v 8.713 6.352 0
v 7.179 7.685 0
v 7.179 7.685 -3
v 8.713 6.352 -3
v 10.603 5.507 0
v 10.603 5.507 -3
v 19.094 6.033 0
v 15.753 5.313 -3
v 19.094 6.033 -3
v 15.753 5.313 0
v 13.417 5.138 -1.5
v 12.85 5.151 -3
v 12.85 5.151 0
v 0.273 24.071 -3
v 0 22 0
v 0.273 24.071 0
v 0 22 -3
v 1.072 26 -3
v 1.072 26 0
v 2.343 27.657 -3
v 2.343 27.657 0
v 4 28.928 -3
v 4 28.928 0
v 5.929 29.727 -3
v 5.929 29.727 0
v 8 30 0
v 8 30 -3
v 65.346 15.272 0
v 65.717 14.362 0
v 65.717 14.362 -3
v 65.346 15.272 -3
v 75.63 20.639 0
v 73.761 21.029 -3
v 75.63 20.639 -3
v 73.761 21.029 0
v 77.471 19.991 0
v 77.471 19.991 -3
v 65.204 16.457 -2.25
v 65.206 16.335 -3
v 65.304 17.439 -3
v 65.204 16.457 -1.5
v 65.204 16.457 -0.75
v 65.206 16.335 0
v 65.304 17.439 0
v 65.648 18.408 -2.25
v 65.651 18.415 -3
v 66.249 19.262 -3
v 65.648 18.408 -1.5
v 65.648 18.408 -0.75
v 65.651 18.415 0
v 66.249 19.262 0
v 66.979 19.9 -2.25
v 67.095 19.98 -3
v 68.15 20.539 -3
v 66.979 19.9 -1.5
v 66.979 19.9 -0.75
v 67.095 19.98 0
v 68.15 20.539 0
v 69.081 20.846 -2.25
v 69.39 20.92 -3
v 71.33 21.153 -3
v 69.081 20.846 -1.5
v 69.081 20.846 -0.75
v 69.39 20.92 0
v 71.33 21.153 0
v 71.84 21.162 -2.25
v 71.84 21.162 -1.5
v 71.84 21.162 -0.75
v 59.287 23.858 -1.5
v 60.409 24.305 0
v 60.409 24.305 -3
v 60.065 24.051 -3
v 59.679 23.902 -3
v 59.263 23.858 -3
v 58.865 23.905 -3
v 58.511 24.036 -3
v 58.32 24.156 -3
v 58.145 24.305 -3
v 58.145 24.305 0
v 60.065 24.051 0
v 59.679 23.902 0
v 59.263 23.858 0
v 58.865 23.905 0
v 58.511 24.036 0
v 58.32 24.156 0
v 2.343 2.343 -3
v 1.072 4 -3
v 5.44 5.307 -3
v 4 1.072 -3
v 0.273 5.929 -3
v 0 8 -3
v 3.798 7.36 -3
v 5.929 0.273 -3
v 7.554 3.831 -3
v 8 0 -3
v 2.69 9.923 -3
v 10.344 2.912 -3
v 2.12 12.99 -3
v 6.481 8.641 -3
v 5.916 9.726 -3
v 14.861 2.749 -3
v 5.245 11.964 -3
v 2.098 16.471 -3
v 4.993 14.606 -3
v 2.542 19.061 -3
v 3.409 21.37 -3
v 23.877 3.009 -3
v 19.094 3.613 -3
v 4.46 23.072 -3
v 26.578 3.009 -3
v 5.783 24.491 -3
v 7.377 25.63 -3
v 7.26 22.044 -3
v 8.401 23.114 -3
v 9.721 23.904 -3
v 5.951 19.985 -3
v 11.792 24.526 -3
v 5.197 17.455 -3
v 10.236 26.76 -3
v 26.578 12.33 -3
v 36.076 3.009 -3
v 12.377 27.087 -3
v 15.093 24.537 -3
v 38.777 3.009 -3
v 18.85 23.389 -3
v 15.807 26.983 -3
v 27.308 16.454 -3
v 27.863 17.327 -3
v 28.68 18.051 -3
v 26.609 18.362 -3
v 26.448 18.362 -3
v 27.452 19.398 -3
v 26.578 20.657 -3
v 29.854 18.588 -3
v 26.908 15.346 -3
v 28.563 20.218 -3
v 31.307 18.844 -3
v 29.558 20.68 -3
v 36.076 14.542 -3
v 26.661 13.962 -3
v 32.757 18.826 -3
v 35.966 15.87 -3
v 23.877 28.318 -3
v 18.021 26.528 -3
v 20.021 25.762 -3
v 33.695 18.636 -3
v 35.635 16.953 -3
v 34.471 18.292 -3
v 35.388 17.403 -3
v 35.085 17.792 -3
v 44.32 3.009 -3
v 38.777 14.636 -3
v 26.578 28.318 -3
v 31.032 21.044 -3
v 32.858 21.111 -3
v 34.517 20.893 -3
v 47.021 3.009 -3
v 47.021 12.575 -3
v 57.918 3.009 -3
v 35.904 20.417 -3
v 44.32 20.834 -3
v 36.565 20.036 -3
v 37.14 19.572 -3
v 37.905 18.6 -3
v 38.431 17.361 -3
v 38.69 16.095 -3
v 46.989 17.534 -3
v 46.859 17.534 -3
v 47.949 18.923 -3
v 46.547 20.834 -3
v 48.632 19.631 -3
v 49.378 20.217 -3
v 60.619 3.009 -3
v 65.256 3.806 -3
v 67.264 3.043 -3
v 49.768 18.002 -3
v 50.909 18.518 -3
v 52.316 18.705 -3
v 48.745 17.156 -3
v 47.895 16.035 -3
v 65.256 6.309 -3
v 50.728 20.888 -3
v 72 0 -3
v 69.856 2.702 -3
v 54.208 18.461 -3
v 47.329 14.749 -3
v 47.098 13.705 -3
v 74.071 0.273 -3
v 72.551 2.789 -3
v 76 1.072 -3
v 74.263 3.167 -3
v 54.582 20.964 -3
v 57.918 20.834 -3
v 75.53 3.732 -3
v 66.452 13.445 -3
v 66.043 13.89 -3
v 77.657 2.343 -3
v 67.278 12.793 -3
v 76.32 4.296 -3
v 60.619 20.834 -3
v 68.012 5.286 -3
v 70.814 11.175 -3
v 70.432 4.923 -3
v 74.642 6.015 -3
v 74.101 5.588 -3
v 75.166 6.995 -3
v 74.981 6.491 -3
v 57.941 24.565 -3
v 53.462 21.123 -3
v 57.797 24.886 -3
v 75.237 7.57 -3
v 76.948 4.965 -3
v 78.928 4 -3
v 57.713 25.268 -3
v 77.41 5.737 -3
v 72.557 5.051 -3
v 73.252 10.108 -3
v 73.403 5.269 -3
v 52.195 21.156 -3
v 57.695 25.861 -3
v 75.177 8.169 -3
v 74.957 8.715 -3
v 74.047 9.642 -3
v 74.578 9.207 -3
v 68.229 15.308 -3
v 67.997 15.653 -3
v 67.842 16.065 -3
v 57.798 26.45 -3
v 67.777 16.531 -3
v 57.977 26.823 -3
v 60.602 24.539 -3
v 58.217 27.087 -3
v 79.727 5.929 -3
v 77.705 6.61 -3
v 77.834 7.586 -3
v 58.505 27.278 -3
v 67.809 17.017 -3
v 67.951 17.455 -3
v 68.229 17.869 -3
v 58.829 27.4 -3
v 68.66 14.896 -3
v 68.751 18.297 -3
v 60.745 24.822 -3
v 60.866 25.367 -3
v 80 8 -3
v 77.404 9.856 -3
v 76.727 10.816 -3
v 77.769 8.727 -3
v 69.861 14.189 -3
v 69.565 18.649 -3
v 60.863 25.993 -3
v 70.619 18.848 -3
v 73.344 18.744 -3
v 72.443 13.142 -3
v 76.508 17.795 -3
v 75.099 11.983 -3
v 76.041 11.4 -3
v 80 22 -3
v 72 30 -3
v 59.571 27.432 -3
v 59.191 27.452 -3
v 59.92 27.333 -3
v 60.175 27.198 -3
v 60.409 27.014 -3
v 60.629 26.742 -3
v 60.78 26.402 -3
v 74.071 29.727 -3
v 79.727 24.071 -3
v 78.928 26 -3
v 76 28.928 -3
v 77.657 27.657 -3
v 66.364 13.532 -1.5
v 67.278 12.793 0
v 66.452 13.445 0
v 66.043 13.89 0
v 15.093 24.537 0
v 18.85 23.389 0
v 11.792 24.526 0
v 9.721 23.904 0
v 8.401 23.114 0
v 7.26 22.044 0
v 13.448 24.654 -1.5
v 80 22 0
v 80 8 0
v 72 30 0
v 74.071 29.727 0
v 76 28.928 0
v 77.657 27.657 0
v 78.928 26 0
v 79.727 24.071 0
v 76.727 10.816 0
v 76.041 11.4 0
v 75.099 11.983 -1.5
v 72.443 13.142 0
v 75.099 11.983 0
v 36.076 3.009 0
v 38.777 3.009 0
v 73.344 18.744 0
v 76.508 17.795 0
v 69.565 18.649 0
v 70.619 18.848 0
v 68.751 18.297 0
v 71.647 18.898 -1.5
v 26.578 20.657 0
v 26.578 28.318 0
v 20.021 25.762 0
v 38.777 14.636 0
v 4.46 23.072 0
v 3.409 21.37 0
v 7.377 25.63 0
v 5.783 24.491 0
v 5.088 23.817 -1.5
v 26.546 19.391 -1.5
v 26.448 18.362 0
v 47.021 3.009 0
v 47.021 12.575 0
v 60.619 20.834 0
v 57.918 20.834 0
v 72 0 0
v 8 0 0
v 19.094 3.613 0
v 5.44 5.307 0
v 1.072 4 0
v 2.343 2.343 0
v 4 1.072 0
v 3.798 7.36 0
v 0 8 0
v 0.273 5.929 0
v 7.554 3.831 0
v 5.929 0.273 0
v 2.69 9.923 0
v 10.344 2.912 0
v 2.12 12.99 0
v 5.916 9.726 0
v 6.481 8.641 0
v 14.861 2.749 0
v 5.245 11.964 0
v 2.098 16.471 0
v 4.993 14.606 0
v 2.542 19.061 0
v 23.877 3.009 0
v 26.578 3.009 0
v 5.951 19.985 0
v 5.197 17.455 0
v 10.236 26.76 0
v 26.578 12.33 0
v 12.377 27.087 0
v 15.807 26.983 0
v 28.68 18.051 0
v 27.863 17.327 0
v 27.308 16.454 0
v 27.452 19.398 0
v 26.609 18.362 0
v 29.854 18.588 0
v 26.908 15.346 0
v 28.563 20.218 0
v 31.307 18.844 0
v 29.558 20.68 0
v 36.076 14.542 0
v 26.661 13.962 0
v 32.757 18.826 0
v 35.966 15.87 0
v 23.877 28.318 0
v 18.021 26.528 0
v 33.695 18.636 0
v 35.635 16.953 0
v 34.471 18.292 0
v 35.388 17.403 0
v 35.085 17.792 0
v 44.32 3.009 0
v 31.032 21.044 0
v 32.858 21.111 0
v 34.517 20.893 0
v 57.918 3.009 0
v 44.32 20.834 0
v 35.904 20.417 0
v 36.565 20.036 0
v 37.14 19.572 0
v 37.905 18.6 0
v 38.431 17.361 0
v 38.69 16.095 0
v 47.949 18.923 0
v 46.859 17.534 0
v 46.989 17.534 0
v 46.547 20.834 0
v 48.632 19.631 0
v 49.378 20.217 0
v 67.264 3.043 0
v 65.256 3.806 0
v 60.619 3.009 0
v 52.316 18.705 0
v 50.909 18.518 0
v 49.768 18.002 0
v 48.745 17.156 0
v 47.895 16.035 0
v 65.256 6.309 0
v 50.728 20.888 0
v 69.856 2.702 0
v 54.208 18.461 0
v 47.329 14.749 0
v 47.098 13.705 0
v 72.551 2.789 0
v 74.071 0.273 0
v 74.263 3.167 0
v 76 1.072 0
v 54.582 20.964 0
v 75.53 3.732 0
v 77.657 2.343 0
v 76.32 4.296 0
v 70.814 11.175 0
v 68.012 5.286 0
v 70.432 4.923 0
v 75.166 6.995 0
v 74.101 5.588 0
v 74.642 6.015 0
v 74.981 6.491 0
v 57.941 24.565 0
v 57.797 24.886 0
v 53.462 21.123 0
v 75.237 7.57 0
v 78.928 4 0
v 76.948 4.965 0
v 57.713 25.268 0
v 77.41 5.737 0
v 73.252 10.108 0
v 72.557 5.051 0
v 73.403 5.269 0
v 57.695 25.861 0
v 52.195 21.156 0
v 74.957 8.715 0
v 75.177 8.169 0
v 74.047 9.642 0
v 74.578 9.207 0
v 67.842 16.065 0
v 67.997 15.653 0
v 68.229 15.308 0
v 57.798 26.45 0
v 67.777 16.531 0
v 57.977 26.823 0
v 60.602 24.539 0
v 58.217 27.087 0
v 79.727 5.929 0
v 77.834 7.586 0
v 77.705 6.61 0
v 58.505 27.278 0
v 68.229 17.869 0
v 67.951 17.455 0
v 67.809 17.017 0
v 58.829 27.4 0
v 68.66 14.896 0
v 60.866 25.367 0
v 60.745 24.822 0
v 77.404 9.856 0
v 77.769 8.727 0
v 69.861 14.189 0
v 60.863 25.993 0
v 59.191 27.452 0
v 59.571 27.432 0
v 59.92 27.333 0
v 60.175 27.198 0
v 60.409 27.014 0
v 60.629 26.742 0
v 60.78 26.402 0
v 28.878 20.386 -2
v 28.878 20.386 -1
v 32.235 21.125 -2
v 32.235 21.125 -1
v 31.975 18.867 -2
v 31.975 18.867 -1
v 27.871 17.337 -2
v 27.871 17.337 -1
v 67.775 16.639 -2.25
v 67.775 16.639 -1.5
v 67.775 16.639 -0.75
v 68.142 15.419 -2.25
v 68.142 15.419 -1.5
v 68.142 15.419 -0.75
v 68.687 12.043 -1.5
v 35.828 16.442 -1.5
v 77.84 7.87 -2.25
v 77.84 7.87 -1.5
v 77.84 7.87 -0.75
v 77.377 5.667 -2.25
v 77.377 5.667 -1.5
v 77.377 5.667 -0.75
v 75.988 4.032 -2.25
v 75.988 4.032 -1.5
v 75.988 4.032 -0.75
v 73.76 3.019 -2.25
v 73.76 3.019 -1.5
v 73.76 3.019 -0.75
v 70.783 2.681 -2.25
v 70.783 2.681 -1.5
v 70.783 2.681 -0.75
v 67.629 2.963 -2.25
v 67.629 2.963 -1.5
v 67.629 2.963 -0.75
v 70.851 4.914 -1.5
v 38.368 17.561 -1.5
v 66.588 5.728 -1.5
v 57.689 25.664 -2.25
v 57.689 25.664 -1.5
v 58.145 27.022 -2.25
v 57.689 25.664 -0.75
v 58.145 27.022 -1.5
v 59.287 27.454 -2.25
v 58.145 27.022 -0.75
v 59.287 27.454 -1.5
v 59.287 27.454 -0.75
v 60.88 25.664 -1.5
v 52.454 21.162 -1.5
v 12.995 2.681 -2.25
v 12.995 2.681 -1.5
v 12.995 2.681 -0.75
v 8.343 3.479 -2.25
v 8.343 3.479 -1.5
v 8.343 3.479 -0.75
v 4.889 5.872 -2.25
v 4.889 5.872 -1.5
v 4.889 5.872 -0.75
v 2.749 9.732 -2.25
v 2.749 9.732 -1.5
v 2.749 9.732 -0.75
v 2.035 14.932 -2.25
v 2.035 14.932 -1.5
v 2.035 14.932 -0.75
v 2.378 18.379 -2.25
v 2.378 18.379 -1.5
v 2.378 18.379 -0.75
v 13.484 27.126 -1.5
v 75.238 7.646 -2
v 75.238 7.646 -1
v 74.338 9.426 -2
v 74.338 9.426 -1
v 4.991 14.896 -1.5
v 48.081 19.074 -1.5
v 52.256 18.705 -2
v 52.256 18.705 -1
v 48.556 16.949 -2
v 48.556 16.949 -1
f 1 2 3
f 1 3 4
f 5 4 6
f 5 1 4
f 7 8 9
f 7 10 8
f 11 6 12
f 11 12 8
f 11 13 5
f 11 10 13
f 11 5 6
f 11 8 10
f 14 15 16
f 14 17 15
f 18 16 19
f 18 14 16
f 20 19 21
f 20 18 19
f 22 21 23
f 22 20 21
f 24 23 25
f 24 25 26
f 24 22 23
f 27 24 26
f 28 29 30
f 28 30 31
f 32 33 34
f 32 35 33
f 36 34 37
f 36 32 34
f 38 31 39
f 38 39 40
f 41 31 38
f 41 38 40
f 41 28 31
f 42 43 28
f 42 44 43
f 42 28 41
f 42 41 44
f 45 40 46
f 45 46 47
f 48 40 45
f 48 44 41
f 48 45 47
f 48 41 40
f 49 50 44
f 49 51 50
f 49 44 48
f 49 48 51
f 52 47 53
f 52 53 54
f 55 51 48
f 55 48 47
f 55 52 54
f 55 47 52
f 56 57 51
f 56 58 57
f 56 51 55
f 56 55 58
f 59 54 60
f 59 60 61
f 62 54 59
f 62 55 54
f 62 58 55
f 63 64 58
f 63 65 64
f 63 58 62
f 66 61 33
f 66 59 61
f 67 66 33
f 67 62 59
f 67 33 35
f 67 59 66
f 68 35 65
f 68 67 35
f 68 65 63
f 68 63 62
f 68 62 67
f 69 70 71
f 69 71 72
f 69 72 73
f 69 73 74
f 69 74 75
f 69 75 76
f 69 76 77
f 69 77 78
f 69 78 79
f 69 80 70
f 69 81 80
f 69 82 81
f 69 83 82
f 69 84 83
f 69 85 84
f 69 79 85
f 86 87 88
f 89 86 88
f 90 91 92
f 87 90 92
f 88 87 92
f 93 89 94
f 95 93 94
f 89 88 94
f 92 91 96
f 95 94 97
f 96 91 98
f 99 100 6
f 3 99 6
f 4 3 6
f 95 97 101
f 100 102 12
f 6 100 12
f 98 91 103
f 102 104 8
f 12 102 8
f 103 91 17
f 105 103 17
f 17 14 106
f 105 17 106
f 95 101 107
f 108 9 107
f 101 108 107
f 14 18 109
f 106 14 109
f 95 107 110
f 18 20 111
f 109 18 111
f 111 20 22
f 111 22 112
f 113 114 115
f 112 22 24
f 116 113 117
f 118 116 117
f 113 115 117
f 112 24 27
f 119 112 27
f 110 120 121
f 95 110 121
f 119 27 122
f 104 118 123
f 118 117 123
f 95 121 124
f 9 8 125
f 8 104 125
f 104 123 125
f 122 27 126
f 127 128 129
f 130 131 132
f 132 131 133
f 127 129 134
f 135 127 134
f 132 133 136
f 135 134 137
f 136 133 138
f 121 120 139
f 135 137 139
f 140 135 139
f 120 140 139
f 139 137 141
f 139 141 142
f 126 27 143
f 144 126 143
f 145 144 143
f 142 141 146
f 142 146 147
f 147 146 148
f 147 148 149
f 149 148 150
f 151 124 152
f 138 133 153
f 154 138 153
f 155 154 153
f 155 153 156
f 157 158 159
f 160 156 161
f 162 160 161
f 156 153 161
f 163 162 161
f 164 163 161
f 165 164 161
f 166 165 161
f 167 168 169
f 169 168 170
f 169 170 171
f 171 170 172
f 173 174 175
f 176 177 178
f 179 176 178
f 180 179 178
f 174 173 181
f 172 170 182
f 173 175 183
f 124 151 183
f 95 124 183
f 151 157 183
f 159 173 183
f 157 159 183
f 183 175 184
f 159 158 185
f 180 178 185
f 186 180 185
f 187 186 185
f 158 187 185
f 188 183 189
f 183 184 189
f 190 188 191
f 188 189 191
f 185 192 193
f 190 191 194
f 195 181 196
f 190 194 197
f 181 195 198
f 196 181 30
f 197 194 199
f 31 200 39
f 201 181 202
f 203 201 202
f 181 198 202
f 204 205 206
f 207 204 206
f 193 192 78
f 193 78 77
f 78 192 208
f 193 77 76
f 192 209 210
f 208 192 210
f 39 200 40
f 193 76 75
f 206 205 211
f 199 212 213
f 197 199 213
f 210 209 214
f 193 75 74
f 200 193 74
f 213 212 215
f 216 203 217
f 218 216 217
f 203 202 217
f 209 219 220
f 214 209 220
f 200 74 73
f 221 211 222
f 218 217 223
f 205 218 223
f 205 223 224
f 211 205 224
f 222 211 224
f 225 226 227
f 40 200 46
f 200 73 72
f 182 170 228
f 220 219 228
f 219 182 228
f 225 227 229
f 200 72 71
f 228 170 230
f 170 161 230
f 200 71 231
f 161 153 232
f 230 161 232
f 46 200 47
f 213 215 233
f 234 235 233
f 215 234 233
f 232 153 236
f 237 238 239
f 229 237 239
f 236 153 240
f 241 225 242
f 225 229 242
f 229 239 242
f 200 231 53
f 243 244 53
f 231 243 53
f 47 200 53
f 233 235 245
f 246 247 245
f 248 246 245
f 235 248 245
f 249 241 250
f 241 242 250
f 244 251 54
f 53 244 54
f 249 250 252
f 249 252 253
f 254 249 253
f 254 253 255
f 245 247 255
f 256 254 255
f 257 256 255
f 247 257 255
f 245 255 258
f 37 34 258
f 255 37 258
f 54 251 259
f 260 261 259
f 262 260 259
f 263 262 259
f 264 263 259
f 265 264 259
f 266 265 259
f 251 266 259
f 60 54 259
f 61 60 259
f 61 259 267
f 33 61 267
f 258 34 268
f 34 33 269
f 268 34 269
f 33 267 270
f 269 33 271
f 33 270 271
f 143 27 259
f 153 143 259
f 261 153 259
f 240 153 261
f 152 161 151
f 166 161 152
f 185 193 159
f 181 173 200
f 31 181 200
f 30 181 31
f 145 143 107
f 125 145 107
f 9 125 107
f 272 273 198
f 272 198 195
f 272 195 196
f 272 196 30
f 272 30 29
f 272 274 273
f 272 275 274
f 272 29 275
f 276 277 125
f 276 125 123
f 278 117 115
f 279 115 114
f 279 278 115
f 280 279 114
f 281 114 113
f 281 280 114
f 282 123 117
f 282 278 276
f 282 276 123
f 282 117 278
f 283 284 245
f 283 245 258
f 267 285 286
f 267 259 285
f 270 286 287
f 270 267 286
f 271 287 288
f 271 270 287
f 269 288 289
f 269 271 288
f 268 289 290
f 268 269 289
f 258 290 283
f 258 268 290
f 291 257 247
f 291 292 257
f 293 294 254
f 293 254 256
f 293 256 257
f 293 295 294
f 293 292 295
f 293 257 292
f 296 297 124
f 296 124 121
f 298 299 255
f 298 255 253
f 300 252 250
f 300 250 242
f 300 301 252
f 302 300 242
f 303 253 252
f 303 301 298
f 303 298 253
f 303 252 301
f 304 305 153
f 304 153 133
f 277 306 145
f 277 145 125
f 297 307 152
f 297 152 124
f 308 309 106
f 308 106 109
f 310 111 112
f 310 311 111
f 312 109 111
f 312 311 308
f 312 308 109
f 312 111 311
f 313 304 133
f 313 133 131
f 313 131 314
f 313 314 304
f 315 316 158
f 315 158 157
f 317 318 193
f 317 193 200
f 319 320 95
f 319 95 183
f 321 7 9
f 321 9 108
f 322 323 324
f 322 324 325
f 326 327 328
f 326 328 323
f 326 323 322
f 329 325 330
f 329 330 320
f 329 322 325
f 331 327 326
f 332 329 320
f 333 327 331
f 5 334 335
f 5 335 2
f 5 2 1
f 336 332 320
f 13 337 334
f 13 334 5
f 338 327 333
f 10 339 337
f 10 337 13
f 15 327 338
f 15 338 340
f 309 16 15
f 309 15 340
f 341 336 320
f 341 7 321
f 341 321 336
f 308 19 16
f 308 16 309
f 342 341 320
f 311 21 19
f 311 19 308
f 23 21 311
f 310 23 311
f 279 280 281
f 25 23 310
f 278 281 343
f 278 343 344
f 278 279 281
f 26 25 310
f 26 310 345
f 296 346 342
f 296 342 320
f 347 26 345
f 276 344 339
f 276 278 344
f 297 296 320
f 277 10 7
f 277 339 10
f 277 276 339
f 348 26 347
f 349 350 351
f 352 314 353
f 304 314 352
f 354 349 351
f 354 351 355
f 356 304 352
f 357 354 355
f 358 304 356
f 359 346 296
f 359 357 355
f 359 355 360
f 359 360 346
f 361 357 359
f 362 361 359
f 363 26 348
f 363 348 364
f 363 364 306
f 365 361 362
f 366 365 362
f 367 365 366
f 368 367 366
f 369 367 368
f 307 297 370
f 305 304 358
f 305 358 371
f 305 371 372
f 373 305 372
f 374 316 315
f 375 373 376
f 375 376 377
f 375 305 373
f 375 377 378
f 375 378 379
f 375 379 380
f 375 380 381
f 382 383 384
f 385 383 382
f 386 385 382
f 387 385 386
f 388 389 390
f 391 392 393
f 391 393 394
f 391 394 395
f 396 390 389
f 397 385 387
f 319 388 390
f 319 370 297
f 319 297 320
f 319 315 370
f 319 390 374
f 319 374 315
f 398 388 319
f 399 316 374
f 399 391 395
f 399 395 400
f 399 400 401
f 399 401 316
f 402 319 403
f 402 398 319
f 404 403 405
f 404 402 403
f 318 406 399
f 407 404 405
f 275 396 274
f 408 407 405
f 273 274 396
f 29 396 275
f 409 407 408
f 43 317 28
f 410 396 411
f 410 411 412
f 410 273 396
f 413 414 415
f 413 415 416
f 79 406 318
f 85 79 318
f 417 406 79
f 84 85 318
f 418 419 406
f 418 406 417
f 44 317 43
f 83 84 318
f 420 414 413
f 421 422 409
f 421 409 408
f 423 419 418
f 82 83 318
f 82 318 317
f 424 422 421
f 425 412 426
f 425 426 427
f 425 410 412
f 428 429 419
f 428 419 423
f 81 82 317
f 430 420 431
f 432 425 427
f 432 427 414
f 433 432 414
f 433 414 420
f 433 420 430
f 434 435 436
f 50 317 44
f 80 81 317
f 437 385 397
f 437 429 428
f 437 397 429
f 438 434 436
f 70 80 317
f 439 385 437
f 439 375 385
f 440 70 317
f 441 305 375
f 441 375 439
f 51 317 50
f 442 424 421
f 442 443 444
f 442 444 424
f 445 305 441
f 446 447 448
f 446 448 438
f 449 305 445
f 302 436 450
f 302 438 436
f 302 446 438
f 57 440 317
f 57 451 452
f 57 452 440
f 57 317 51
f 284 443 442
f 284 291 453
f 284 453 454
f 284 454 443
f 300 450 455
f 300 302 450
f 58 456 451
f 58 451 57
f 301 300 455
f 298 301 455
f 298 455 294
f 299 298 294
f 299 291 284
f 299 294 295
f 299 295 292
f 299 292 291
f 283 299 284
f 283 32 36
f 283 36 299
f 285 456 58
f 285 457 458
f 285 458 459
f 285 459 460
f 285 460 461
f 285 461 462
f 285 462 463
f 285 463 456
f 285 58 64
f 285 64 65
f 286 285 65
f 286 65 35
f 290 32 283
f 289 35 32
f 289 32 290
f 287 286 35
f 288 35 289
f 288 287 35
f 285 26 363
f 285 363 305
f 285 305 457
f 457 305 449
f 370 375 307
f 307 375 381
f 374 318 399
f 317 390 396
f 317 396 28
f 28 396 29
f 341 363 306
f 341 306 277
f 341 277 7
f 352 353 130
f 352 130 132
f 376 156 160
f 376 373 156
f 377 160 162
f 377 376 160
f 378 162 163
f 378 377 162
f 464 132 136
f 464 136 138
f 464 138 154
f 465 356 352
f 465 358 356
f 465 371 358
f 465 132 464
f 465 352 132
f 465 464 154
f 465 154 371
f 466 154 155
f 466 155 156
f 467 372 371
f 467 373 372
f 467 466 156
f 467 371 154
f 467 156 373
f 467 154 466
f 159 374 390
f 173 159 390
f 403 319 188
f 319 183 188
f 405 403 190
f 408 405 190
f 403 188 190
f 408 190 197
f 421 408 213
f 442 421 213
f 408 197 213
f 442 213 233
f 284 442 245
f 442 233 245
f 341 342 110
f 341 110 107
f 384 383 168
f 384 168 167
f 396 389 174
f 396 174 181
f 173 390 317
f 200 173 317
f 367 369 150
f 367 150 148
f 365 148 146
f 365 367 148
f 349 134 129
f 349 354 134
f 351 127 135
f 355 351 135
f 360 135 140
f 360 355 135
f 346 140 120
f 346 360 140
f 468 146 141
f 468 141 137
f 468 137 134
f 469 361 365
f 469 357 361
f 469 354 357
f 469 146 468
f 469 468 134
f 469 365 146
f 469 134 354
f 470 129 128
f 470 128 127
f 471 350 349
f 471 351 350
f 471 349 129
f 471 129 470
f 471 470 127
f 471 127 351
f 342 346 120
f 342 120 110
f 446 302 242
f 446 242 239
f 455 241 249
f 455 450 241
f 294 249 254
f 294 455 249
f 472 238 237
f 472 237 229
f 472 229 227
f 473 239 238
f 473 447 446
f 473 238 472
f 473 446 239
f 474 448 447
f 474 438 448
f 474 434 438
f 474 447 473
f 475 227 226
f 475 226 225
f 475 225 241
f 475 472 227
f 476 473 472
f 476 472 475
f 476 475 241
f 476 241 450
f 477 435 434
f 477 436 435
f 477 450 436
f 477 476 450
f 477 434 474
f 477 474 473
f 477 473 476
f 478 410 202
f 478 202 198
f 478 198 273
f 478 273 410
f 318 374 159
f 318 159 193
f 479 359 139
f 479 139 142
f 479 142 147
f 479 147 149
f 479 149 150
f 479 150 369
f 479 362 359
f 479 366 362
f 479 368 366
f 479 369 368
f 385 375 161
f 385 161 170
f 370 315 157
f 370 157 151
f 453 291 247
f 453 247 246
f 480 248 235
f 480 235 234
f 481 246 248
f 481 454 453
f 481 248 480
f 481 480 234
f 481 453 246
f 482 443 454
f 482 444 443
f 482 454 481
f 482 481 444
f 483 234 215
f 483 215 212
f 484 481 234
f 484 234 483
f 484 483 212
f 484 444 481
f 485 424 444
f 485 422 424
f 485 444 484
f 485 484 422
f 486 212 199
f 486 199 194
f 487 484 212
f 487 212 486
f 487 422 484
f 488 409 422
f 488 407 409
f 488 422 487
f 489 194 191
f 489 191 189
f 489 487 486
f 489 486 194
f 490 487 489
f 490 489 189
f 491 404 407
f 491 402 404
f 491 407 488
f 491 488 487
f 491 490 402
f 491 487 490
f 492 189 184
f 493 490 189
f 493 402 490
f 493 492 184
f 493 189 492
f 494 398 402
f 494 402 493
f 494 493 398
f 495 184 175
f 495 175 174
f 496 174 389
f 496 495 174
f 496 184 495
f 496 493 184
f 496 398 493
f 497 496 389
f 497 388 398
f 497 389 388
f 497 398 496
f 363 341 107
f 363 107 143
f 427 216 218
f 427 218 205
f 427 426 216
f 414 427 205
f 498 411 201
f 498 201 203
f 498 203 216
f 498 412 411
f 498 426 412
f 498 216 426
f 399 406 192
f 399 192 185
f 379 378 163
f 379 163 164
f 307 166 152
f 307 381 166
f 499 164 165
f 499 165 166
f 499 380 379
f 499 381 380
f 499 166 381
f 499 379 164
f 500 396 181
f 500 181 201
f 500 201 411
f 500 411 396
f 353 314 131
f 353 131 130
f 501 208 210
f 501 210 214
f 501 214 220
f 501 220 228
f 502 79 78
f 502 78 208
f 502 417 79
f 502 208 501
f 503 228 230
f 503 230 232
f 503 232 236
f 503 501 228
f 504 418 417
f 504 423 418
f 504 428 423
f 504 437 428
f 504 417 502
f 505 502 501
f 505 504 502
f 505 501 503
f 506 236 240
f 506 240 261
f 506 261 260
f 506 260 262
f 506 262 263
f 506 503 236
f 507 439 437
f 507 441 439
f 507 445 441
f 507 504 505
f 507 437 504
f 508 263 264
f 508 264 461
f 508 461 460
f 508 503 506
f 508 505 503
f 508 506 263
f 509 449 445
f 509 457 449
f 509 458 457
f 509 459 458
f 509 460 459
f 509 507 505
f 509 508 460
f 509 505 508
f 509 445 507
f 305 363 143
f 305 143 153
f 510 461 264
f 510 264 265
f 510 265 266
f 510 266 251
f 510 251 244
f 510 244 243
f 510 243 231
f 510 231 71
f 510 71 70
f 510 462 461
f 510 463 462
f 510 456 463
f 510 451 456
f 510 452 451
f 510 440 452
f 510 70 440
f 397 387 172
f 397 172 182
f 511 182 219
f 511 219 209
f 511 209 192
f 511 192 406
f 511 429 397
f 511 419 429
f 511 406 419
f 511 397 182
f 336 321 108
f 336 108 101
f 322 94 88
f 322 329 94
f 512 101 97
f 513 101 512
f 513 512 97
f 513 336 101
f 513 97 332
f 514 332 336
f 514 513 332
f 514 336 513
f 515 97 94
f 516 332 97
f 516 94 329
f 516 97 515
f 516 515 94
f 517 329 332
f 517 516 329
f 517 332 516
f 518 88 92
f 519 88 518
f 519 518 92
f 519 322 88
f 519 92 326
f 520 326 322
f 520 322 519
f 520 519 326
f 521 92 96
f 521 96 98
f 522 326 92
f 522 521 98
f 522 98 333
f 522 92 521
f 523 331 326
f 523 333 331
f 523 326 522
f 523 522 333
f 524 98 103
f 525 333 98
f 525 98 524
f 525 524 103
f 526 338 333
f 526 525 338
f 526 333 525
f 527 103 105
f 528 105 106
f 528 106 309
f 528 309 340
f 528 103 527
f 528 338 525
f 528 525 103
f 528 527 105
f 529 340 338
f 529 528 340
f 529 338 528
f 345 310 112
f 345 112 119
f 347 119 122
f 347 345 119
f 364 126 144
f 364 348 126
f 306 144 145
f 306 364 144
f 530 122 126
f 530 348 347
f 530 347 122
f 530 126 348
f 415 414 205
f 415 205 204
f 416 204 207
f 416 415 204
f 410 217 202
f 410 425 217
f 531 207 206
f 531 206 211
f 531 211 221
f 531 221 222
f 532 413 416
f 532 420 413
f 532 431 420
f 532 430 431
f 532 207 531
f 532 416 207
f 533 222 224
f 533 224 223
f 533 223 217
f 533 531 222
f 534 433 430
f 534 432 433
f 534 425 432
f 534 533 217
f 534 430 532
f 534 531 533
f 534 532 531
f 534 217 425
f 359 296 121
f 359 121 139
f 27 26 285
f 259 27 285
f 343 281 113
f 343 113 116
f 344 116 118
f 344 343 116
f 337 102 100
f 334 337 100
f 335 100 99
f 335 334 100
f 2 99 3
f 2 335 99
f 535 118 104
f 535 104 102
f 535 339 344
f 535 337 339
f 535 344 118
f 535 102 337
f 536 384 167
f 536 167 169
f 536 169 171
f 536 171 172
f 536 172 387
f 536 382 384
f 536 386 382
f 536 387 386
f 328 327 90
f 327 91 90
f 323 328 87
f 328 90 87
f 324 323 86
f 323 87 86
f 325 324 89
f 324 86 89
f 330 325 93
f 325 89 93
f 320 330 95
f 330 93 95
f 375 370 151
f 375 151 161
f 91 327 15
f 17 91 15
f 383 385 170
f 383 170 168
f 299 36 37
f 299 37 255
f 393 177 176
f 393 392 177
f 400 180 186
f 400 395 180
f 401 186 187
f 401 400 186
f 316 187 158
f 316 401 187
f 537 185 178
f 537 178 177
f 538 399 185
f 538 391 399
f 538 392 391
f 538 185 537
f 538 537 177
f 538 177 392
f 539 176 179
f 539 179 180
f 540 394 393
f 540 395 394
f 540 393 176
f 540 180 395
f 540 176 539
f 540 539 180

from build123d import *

# Parameters (mm, degrees)
F0_W     = 80
F0_H     = 30
F0_W_2   = 2.7010148322
F0_H_2   = 17.8246161853
F1_DEPTH = 3
F2_R     = 8


with BuildPart() as f1:
    # F0 (on Top) → F1 (new body)
    with BuildSketch(Plane.XY):
        with Locations((40, 15)):
            Rectangle(F0_W, F0_H)
        with BuildLine():
            add(Edge.make_bspline(
                [(18.8498568826, 23.389279209), (16.1488420505, 24.6539162113), (13.4478272183, 24.6539162113)],
                knots=[0, 0, 0, 1, 1, 1], degree=2))
            add(Edge.make_bspline(
                [(13.4478272183, 24.6539162113), (9.5290137913, 24.6539162113), (7.2599531616, 22.0439760604)],
                knots=[0, 0, 0, 1, 1, 1], degree=2))
            add(Edge.make_bspline(
                [(7.2599531616, 22.0439760604), (4.9908925319, 19.4340359094), (4.9908925319, 14.89591465)],
                knots=[0, 0, 0, 1, 1, 1], degree=2))
            add(Edge.make_bspline(
                [(4.9908925319, 14.89591465), (4.9908925319, 10.2328909706), (7.1792870154, 7.6854020297)],
                knots=[0, 0, 0, 1, 1, 1], degree=2))
            add(Edge.make_bspline(
                [(7.1792870154, 7.6854020297), (9.3676814988, 5.1379130887), (13.4166016133, 5.1379130887)],
                knots=[0, 0, 0, 1, 1, 1], degree=2))
            add(Edge.make_bspline(
                [(13.4166016133, 5.1379130887), (15.904241478, 5.1379130887), (19.0944574551, 6.0330470986)],
                knots=[0, 0, 0, 1, 1, 1], degree=2))
            Line((19.0944574551, 6.0330470986), (19.0944574551, 3.6130627114))
            add(Edge.make_bspline(
                [(19.0944574551, 3.6130627114), (16.6224303929, 2.681498829), (12.9950559459, 2.681498829)],
                knots=[0, 0, 0, 1, 1, 1], degree=2))
            add(Edge.make_bspline(
                [(12.9950559459, 2.681498829), (7.743950039, 2.681498829), (4.8894093156, 5.8717148061)],
                knots=[0, 0, 0, 1, 1, 1], degree=2))
            add(Edge.make_bspline(
                [(4.8894093156, 5.8717148061), (2.0348685922, 9.0619307832), (2.0348685922, 14.9323445225)],
                knots=[0, 0, 0, 1, 1, 1], degree=2))
            add(Edge.make_bspline(
                [(2.0348685922, 14.9323445225), (2.0348685922, 18.606557377), (3.4087952121, 21.3700234192)],
                knots=[0, 0, 0, 1, 1, 1], degree=2))
            add(Edge.make_bspline(
                [(3.4087952121, 21.3700234192), (4.7827218319, 24.1334894614), (7.3770491803, 25.6297163674)],
                knots=[0, 0, 0, 1, 1, 1], degree=2))
            add(Edge.make_bspline(
                [(7.3770491803, 25.6297163674), (9.9713765288, 27.1259432735), (13.4842570908, 27.1259432735)],
                knots=[0, 0, 0, 1, 1, 1], degree=2))
            add(Edge.make_bspline(
                [(13.4842570908, 27.1259432735), (17.2209211553, 27.1259432735), (20.02081707, 25.7624251887)],
                knots=[0, 0, 0, 1, 1, 1], degree=2))
            Line((20.02081707, 25.7624251887), (18.8498568826, 23.389279209))
        make_face(mode=Mode.SUBTRACT)
        with BuildLine():
            add(Edge.make_bspline(
                [(49.3780900338, 20.2172781681), (50.7780379912, 21.1618527192), (52.4538121259, 21.1618527192)],
                knots=[0, 0, 0, 1, 1, 1], degree=2))
            add(Edge.make_bspline(
                [(52.4538121259, 21.1618527192), (53.6403851158, 21.1618527192), (54.5823575332, 20.9640905543)],
                knots=[0, 0, 0, 1, 1, 1], degree=2))
            Line((54.5823575332, 20.9640905543), (54.2076502732, 18.4608378871))
            add(Edge.make_bspline(
                [(54.2076502732, 18.4608378871), (53.1043455634, 18.7054384595), (52.256049961, 18.7054384595)],
                knots=[0, 0, 0, 1, 1, 1], degree=2))
            add(Edge.make_bspline(
                [(52.256049961, 18.7054384595), (50.0910746812, 18.7054384595), (48.5558157689, 16.9489981785)],
                knots=[0, 0, 0, 1, 1, 1], degree=2))
            add(Edge.make_bspline(
                [(48.5558157689, 16.9489981785), (47.0205568566, 15.1925578975), (47.0205568566, 12.5748113453)],
                knots=[0, 0, 0, 1, 1, 1], degree=2))
            Line((47.0205568566, 12.5748113453), (47.0205568566, 3.0093676815))
            Line((47.0205568566, 3.0093676815), (44.3195420245, 3.0093676815))
            Line((44.3195420245, 3.0093676815), (44.3195420245, 20.8339838668))
            Line((44.3195420245, 20.8339838668), (46.5469685142, 20.8339838668))
            Line((46.5469685142, 20.8339838668), (46.8592245641, 17.5344782722))
            Line((46.8592245641, 17.5344782722), (46.9893312516, 17.5344782722))
            add(Edge.make_bspline(
                [(46.9893312516, 17.5344782722), (47.9781420765, 19.272703617), (49.3780900338, 20.2172781681)],
                knots=[0, 0, 0, 1, 1, 1], degree=2))
        make_face(mode=Mode.SUBTRACT)
        with Locations((59.2688004163, 11.9216757741)):
            Rectangle(F0_W_2, F0_H_2, mode=Mode.SUBTRACT)
        with BuildLine():
            add(Edge.make_bspline(
                [(76.7265157429, 10.8157689305), (77.8402289878, 9.6448087432), (77.8402289878, 7.8701535259)],
                knots=[0, 0, 0, 1, 1, 1], degree=2))
            add(Edge.make_bspline(
                [(77.8402289878, 7.8701535259), (77.8402289878, 5.3825136612), (75.987509758, 4.0320062451)],
                knots=[0, 0, 0, 1, 1, 1], degree=2))
            add(Edge.make_bspline(
                [(75.987509758, 4.0320062451), (74.1347905282, 2.681498829), (70.7832422587, 2.681498829)],
                knots=[0, 0, 0, 1, 1, 1], degree=2))
            add(Edge.make_bspline(
                [(70.7832422587, 2.681498829), (67.2391360916, 2.681498829), (65.2563101743, 3.8056206089)],
                knots=[0, 0, 0, 1, 1, 1], degree=2))
            Line((65.2563101743, 3.8056206089), (65.2563101743, 6.3088732761))
            add(Edge.make_bspline(
                [(65.2563101743, 6.3088732761), (66.5417642467, 5.6583398387), (68.0119698152, 5.2862347125)],
                knots=[0, 0, 0, 1, 1, 1], degree=2))
            add(Edge.make_bspline(
                [(68.0119698152, 5.2862347125), (69.4821753838, 4.9141295863), (70.8508977361, 4.9141295863)],
                knots=[0, 0, 0, 1, 1, 1], degree=2))
            add(Edge.make_bspline(
                [(70.8508977361, 4.9141295863), (72.9638303409, 4.9141295863), (74.1009627895, 5.5880822274)],
                knots=[0, 0, 0, 1, 1, 1], degree=2))
            add(Edge.make_bspline(
                [(74.1009627895, 5.5880822274), (75.2380952381, 6.2620348686), (75.2380952381, 7.6463700234)],
                knots=[0, 0, 0, 1, 1, 1], degree=2))
            add(Edge.make_bspline(
                [(75.2380952381, 7.6463700234), (75.2380952381, 8.6872235233), (74.3377569607, 9.4262295082)],
                knots=[0, 0, 0, 1, 1, 1], degree=2))
            add(Edge.make_bspline(
                [(74.3377569607, 9.4262295082), (73.4374186833, 10.1652354931), (70.8144678636, 11.174863388)],
                knots=[0, 0, 0, 1, 1, 1], degree=2))
            add(Edge.make_bspline(
                [(70.8144678636, 11.174863388), (68.326827999, 12.1012230029), (67.2781680978, 12.7933905803)],
                knots=[0, 0, 0, 1, 1, 1], degree=2))
            add(Edge.make_bspline(
                [(67.2781680978, 12.7933905803), (66.2295081967, 13.4855581577), (65.716887848, 14.3624772313)],
                knots=[0, 0, 0, 1, 1, 1], degree=2))
            add(Edge.make_bspline(
                [(65.716887848, 14.3624772313), (65.2042674993, 15.239396305), (65.2042674993, 16.4571948998)],
                knots=[0, 0, 0, 1, 1, 1], degree=2))
            add(Edge.make_bspline(
                [(65.2042674993, 16.4571948998), (65.2042674993, 18.637782982), (66.9789227166, 19.8998178506)],
                knots=[0, 0, 0, 1, 1, 1], degree=2))
            add(Edge.make_bspline(
                [(66.9789227166, 19.8998178506), (68.7535779339, 21.1618527192), (71.839708561, 21.1618527192)],
                knots=[0, 0, 0, 1, 1, 1], degree=2))
            add(Edge.make_bspline(
                [(71.839708561, 21.1618527192), (74.7176684882, 21.1618527192), (77.4707259953, 19.9908925319)],
                knots=[0, 0, 0, 1, 1, 1], degree=2))
            Line((77.4707259953, 19.9908925319), (76.5079365079, 17.7946916472))
            add(Edge.make_bspline(
                [(76.5079365079, 17.7946916472), (73.8277387458, 18.897996357), (71.6471506635, 18.897996357)],
                knots=[0, 0, 0, 1, 1, 1], degree=2))
            add(Edge.make_bspline(
                [(71.6471506635, 18.897996357), (69.7267759563, 18.897996357), (68.7509758002, 18.2969034608)],
                knots=[0, 0, 0, 1, 1, 1], degree=2))
            add(Edge.make_bspline(
                [(68.7509758002, 18.2969034608), (67.775175644, 17.6958105647), (67.775175644, 16.6393442623)],
                knots=[0, 0, 0, 1, 1, 1], degree=2))
            add(Edge.make_bspline(
                [(67.775175644, 16.6393442623), (67.775175644, 15.9211553474), (68.1420765027, 15.4189435337)],
                knots=[0, 0, 0, 1, 1, 1], degree=2))
            add(Edge.make_bspline(
                [(68.1420765027, 15.4189435337), (68.5089773614, 14.91673172), (69.3208430913, 14.4613583138)],
                knots=[0, 0, 0, 1, 1, 1], degree=2))
            add(Edge.make_bspline(
                [(69.3208430913, 14.4613583138), (70.1327088212, 14.0059849076), (72.4434035909, 13.1420765027)],
                knots=[0, 0, 0, 1, 1, 1], degree=2))
            add(Edge.make_bspline(
                [(72.4434035909, 13.1420765027), (75.612802498, 11.9867291179), (76.7265157429, 10.8157689305)],
                knots=[0, 0, 0, 1, 1, 1], degree=2))
        make_face(mode=Mode.SUBTRACT)
        with BuildLine():
            Line((38.7769971377, 3.0093676815), (36.0759823055, 3.0093676815))
            Line((36.0759823055, 3.0093676815), (36.0759823055, 14.5420244601))
            add(Edge.make_bspline(
                [(36.0759823055, 14.5420244601), (36.0759823055, 16.7174082748), (35.0845693469, 17.7920895134)],
                knots=[0, 0, 0, 1, 1, 1], degree=2))
            add(Edge.make_bspline(
                [(35.0845693469, 17.7920895134), (34.0931563882, 18.866770752), (31.975019516, 18.866770752)],
                knots=[0, 0, 0, 1, 1, 1], degree=2))
            add(Edge.make_bspline(
                [(31.975019516, 18.866770752), (29.1647150664, 18.866770752), (27.8714545928, 17.3367161072)],
                knots=[0, 0, 0, 1, 1, 1], degree=2))
            add(Edge.make_bspline(
                [(27.8714545928, 17.3367161072), (26.5781941192, 15.8066614624), (26.5781941192, 12.3302107728)],
                knots=[0, 0, 0, 1, 1, 1], degree=2))
            Line((26.5781941192, 12.3302107728), (26.5781941192, 3.0093676815))
            Line((26.5781941192, 3.0093676815), (23.877179287, 3.0093676815))
            Line((23.877179287, 3.0093676815), (23.877179287, 28.3177205308))
            Line((23.877179287, 28.3177205308), (26.5781941192, 28.3177205308))
            Line((26.5781941192, 28.3177205308), (26.5781941192, 20.6570387718))
            add(Edge.make_bspline(
                [(26.5781941192, 20.6570387718), (26.5781941192, 19.272703617), (26.4480874317, 18.3619568046)],
                knots=[0, 0, 0, 1, 1, 1], degree=2))
            Line((26.4480874317, 18.3619568046), (26.6094197242, 18.3619568046))
            add(Edge.make_bspline(
                [(26.6094197242, 18.3619568046), (27.4056726516, 19.6474108769), (28.8784803539, 20.3864168618)],
                knots=[0, 0, 0, 1, 1, 1], degree=2))
            add(Edge.make_bspline(
                [(28.8784803539, 20.3864168618), (30.3512880562, 21.1254228467), (32.235232891, 21.1254228467)],
                knots=[0, 0, 0, 1, 1, 1], degree=2))
            add(Edge.make_bspline(
                [(32.235232891, 21.1254228467), (35.5035128806, 21.1254228467), (37.1402550091, 19.5719489982)],
                knots=[0, 0, 0, 1, 1, 1], degree=2))
            add(Edge.make_bspline(
                [(37.1402550091, 19.5719489982), (38.7769971377, 18.0184751496), (38.7769971377, 14.635701275)],
                knots=[0, 0, 0, 1, 1, 1], degree=2))
            Line((38.7769971377, 14.635701275), (38.7769971377, 3.0093676815))
        make_face(mode=Mode.SUBTRACT)
        with BuildLine():
            add(Edge.make_bspline(
                [(58.1446786365, 24.3052302888), (57.6893052303, 24.7527972938), (57.6893052303, 25.6635441062)],
                knots=[0, 0, 0, 1, 1, 1], degree=2))
            add(Edge.make_bspline(
                [(57.6893052303, 25.6635441062), (57.6893052303, 26.5899037211), (58.1446786365, 27.0218579235)],
                knots=[0, 0, 0, 1, 1, 1], degree=2))
            add(Edge.make_bspline(
                [(58.1446786365, 27.0218579235), (58.6000520427, 27.4538121259), (59.2870153526, 27.4538121259)],
                knots=[0, 0, 0, 1, 1, 1], degree=2))
            add(Edge.make_bspline(
                [(59.2870153526, 27.4538121259), (59.93754879, 27.4538121259), (60.4085349987, 27.0140515222)],
                knots=[0, 0, 0, 1, 1, 1], degree=2))
            add(Edge.make_bspline(
                [(60.4085349987, 27.0140515222), (60.8795212074, 26.5742909186), (60.8795212074, 25.6635441062)],
                knots=[0, 0, 0, 1, 1, 1], degree=2))
            add(Edge.make_bspline(
                [(60.8795212074, 25.6635441062), (60.8795212074, 24.7527972938), (60.4085349987, 24.3052302888)],
                knots=[0, 0, 0, 1, 1, 1], degree=2))
            add(Edge.make_bspline(
                [(60.4085349987, 24.3052302888), (59.93754879, 23.8576632839), (59.2870153526, 23.8576632839)],
                knots=[0, 0, 0, 1, 1, 1], degree=2))
            add(Edge.make_bspline(
                [(59.2870153526, 23.8576632839), (58.6000520427, 23.8576632839), (58.1446786365, 24.3052302888)],
                knots=[0, 0, 0, 1, 1, 1], degree=2))
        make_face(mode=Mode.SUBTRACT)
    extrude(amount=-F1_DEPTH)

    # F2
    f2_edges = [f1.edges().sort_by_distance(p)[0] for p in [
        (0, 30, -1.5),
        (0, 0, -1.5),
        (80, 30, -1.5),
        (80, 0, -1.5),
    ]]
    fillet(f2_edges, radius=F2_R)


solid = f1.part
